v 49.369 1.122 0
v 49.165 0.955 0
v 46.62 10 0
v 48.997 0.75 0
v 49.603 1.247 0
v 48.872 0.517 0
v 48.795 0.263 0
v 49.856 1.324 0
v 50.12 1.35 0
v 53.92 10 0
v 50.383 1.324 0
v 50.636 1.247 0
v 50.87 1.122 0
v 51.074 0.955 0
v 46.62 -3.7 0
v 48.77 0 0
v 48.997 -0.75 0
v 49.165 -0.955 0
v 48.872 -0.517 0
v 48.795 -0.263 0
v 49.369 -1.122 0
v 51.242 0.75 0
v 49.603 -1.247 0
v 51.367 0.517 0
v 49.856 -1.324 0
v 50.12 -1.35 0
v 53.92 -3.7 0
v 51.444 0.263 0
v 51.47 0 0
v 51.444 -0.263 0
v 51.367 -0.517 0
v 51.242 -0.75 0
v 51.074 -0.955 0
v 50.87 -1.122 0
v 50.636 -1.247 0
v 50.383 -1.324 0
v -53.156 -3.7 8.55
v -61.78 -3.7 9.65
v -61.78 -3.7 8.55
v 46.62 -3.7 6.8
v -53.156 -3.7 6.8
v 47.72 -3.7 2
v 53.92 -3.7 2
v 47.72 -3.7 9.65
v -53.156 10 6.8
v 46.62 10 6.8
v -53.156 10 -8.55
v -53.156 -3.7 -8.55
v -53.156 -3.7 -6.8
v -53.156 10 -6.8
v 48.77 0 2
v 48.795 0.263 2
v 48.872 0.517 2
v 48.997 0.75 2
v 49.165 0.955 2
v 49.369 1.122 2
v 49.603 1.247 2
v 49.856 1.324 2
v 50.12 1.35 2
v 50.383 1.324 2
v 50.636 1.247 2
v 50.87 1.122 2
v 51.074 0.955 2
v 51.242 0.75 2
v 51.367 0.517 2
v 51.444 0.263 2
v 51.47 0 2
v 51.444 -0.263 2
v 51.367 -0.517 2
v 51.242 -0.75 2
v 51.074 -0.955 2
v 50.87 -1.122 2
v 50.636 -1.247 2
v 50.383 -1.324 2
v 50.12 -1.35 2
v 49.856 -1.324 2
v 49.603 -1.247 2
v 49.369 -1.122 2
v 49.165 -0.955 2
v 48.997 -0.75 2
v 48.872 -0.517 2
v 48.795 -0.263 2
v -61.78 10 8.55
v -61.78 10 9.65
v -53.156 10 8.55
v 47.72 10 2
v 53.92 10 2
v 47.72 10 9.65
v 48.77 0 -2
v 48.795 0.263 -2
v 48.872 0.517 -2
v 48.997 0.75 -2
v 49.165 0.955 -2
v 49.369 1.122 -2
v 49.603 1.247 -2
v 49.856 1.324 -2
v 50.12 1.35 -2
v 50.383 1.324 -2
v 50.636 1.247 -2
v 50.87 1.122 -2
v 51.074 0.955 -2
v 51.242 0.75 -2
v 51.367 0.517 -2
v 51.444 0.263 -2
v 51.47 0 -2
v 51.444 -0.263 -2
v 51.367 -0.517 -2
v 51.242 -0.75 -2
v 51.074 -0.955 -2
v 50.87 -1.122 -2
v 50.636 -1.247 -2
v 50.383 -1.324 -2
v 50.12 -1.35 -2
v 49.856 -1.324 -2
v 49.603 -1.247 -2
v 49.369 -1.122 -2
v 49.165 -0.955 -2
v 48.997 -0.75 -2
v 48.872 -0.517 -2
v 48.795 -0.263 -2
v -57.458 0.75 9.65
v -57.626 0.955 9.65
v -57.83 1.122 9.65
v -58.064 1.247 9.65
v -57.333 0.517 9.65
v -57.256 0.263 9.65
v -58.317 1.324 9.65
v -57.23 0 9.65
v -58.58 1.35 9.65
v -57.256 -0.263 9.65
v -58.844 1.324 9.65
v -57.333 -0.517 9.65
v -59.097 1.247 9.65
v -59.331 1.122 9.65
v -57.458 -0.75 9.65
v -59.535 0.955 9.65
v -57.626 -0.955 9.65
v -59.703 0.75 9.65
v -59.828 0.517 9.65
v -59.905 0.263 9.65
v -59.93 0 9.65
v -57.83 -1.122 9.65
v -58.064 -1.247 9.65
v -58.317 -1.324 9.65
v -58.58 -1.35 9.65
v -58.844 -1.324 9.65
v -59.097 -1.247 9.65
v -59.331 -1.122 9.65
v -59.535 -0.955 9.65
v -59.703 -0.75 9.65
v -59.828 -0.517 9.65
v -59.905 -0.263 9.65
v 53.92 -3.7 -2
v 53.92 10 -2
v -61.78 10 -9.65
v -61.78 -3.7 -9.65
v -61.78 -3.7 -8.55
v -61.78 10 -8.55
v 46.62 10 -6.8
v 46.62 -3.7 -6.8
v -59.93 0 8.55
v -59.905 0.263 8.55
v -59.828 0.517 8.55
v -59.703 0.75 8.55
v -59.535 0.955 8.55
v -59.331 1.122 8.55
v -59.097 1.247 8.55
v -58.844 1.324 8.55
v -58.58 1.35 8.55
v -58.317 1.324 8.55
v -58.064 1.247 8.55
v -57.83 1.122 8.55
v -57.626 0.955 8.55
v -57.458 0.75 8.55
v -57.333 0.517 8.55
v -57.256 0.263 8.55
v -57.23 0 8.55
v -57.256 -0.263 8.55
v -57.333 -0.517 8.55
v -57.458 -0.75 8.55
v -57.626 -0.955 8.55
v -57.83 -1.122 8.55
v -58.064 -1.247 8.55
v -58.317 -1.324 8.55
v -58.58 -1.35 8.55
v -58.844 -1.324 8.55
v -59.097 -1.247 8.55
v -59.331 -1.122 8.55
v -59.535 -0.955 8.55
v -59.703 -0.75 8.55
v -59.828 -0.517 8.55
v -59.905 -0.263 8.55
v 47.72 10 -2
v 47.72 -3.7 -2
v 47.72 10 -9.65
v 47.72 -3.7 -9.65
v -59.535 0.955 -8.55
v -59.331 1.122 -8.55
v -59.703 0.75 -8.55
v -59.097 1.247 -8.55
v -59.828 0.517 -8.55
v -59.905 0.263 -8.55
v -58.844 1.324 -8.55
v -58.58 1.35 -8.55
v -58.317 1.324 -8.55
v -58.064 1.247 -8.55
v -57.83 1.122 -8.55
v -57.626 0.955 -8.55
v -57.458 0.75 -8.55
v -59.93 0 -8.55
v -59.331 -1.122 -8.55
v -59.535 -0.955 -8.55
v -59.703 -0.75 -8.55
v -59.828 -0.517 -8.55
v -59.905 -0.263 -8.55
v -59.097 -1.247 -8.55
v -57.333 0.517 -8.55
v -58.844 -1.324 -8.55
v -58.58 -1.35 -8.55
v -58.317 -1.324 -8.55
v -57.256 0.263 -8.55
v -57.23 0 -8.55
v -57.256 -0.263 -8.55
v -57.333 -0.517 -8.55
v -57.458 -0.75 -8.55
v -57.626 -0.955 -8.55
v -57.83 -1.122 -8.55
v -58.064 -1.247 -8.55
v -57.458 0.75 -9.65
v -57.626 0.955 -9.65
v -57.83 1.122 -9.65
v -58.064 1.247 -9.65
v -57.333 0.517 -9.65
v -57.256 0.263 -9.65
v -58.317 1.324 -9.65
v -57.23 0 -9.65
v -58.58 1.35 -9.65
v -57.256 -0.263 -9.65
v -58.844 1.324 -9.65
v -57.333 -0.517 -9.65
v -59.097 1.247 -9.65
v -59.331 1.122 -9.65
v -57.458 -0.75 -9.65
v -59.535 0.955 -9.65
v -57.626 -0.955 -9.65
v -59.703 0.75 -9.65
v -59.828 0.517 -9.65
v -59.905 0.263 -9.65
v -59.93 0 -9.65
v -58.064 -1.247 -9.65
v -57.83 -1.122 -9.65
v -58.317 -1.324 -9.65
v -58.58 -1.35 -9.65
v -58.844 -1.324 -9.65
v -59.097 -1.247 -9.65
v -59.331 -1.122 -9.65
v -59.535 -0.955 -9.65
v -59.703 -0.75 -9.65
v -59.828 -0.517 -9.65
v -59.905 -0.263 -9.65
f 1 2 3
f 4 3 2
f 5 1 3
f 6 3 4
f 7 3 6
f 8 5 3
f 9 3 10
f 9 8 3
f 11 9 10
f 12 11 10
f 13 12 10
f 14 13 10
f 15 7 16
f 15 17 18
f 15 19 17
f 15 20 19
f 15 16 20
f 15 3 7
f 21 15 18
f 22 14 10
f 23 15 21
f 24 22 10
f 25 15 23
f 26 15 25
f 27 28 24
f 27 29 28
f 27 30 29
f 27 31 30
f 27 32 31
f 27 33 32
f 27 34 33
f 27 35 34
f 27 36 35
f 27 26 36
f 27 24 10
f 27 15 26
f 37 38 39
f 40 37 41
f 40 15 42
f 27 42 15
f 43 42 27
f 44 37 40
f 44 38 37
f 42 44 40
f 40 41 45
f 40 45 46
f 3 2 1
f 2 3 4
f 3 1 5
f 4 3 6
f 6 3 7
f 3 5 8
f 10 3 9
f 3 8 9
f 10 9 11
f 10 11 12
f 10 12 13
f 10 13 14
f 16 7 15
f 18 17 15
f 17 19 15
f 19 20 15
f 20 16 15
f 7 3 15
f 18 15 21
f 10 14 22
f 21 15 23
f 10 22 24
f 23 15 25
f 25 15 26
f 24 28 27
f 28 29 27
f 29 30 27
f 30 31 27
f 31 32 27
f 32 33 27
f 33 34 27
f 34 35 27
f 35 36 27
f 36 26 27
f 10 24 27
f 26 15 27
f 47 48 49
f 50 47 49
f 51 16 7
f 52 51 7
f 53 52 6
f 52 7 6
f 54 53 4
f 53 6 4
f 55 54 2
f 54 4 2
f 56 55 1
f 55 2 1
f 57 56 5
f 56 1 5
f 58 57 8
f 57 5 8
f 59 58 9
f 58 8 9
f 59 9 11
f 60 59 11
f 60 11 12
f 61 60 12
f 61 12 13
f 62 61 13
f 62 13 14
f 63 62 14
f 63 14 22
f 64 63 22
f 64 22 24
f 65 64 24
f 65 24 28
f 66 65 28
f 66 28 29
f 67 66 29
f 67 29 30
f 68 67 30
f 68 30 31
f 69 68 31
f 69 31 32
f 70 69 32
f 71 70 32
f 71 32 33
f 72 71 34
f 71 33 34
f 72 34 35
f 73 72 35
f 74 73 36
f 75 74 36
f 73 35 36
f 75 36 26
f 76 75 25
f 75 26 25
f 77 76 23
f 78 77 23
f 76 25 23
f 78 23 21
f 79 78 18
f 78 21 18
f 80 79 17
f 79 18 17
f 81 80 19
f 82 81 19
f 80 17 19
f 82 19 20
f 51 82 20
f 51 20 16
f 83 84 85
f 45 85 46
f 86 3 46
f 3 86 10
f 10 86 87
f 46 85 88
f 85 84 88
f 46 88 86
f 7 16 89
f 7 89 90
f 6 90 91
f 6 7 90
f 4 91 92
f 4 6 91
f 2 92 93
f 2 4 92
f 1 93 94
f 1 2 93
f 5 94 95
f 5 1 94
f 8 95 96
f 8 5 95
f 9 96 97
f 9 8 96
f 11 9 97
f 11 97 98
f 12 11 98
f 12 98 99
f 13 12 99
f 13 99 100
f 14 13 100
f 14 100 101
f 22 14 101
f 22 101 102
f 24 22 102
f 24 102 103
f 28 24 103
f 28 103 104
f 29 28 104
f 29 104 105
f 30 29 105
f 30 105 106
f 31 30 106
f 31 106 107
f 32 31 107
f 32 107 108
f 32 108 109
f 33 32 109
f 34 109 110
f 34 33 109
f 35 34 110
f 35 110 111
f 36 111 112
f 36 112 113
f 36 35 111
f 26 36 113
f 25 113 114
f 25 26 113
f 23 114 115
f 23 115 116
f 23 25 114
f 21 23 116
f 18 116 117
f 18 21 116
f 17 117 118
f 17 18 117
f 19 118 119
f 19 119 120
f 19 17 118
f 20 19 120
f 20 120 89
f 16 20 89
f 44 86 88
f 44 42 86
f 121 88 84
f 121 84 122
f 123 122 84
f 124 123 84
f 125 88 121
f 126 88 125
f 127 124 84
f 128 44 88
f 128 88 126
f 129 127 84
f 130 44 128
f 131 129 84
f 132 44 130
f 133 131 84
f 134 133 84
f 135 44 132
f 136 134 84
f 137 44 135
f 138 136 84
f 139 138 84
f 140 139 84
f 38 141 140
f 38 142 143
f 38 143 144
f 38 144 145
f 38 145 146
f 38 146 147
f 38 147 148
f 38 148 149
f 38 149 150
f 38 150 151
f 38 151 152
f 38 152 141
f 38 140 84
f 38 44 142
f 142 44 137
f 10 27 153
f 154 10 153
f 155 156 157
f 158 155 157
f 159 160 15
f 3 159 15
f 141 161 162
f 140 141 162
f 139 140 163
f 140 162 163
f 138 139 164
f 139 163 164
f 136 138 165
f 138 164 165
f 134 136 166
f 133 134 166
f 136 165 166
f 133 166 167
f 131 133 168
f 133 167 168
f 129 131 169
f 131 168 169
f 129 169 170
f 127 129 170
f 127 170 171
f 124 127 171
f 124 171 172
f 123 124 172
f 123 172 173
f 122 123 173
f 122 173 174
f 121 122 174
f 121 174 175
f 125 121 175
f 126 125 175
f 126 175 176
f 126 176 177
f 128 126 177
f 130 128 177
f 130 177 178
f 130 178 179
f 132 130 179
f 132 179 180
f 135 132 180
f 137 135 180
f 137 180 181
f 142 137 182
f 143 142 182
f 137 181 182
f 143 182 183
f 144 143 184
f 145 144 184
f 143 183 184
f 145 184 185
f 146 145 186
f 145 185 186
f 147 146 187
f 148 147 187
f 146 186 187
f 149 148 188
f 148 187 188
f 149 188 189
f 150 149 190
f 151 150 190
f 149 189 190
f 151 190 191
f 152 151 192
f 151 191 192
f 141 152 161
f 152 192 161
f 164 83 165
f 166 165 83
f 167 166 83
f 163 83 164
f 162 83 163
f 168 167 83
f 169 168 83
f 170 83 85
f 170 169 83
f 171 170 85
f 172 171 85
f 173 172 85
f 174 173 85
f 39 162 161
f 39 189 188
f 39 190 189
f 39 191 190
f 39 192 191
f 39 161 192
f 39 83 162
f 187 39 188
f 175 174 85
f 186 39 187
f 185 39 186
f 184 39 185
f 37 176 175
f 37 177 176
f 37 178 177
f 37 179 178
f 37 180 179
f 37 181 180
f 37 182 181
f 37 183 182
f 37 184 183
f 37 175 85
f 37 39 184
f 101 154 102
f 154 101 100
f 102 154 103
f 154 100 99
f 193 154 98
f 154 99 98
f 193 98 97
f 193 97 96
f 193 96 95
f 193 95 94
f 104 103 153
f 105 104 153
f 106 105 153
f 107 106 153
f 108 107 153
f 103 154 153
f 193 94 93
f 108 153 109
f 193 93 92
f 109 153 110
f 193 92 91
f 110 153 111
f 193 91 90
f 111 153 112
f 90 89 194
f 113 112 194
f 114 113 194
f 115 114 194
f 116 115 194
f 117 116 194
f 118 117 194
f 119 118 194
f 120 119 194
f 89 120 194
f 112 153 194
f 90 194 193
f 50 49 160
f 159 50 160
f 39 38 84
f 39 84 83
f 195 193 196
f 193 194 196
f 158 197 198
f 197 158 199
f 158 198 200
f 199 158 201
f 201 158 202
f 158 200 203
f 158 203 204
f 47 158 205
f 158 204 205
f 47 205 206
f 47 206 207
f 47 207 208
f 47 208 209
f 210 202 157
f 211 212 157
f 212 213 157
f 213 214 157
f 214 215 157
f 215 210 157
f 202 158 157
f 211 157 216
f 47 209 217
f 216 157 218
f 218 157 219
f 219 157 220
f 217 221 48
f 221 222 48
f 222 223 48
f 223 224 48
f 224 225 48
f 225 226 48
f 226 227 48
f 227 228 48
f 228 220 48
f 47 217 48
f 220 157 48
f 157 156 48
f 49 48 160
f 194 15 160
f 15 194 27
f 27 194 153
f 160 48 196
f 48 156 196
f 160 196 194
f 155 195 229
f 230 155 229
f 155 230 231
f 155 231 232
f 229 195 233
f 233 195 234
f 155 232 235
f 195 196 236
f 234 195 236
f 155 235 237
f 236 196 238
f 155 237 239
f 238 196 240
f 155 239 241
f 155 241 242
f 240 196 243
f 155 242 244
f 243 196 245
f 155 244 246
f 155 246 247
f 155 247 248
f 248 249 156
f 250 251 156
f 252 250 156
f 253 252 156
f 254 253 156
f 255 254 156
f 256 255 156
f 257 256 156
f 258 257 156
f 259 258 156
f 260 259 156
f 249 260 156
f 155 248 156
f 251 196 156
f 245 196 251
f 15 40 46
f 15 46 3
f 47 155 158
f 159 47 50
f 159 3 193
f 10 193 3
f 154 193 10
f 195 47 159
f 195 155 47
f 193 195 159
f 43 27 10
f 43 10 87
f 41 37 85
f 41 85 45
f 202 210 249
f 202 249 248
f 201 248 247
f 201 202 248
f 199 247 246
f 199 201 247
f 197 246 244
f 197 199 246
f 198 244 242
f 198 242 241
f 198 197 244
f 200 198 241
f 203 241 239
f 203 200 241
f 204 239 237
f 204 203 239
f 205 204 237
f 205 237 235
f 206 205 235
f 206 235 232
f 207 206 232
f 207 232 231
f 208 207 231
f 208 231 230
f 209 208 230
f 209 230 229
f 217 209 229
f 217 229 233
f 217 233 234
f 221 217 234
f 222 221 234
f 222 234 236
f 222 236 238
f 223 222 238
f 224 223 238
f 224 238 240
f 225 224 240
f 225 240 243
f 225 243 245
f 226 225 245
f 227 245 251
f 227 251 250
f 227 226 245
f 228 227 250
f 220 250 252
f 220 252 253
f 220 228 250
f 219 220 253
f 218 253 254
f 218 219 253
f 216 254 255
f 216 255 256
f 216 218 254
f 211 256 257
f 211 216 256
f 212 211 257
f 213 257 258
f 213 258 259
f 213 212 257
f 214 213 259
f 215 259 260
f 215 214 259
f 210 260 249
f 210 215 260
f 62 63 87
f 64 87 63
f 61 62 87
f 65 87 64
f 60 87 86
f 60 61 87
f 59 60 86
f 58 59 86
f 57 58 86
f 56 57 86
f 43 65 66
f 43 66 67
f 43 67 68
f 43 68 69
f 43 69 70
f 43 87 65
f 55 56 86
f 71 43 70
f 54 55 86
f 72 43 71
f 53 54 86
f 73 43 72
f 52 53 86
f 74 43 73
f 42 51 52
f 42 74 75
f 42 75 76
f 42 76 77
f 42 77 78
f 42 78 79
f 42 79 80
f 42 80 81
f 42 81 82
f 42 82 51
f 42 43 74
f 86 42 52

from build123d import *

# Parameters (mm, degrees)
F1_DEPTH      = 3.7
F1_DEPTH_BACK = 10
F4_D          = 2.7


with BuildPart() as f1:
    # F0 (on Front) → F1 (new body, two sides)
    with BuildSketch(Plane.XZ) as f1_sk:
        Polygon((47.719514, 9.65), (-61.780486, 9.65), (-61.780486, 8.55), (-53.156097, 8.55), (-53.156097, 6.8), (46.619514, 6.8), (46.619514, 0), (53.919514, 0), (53.919514, 2), (47.719514, 2), align=None)
    extrude(amount=F1_DEPTH)
    extrude(f1_sk.sketch, amount=-F1_DEPTH_BACK)

    # F4 (through all)
    with Locations(Plane.XY.offset(2)):
        with Locations((50.119514, 0), (-58.580486, 0)):
            Hole(F4_D / 2)


with BuildPart() as f5_1:
    # F5: instance of F1
    add(f1.part.mirror(Plane.XY))


solid = Compound([f1.part, f5_1.part])
